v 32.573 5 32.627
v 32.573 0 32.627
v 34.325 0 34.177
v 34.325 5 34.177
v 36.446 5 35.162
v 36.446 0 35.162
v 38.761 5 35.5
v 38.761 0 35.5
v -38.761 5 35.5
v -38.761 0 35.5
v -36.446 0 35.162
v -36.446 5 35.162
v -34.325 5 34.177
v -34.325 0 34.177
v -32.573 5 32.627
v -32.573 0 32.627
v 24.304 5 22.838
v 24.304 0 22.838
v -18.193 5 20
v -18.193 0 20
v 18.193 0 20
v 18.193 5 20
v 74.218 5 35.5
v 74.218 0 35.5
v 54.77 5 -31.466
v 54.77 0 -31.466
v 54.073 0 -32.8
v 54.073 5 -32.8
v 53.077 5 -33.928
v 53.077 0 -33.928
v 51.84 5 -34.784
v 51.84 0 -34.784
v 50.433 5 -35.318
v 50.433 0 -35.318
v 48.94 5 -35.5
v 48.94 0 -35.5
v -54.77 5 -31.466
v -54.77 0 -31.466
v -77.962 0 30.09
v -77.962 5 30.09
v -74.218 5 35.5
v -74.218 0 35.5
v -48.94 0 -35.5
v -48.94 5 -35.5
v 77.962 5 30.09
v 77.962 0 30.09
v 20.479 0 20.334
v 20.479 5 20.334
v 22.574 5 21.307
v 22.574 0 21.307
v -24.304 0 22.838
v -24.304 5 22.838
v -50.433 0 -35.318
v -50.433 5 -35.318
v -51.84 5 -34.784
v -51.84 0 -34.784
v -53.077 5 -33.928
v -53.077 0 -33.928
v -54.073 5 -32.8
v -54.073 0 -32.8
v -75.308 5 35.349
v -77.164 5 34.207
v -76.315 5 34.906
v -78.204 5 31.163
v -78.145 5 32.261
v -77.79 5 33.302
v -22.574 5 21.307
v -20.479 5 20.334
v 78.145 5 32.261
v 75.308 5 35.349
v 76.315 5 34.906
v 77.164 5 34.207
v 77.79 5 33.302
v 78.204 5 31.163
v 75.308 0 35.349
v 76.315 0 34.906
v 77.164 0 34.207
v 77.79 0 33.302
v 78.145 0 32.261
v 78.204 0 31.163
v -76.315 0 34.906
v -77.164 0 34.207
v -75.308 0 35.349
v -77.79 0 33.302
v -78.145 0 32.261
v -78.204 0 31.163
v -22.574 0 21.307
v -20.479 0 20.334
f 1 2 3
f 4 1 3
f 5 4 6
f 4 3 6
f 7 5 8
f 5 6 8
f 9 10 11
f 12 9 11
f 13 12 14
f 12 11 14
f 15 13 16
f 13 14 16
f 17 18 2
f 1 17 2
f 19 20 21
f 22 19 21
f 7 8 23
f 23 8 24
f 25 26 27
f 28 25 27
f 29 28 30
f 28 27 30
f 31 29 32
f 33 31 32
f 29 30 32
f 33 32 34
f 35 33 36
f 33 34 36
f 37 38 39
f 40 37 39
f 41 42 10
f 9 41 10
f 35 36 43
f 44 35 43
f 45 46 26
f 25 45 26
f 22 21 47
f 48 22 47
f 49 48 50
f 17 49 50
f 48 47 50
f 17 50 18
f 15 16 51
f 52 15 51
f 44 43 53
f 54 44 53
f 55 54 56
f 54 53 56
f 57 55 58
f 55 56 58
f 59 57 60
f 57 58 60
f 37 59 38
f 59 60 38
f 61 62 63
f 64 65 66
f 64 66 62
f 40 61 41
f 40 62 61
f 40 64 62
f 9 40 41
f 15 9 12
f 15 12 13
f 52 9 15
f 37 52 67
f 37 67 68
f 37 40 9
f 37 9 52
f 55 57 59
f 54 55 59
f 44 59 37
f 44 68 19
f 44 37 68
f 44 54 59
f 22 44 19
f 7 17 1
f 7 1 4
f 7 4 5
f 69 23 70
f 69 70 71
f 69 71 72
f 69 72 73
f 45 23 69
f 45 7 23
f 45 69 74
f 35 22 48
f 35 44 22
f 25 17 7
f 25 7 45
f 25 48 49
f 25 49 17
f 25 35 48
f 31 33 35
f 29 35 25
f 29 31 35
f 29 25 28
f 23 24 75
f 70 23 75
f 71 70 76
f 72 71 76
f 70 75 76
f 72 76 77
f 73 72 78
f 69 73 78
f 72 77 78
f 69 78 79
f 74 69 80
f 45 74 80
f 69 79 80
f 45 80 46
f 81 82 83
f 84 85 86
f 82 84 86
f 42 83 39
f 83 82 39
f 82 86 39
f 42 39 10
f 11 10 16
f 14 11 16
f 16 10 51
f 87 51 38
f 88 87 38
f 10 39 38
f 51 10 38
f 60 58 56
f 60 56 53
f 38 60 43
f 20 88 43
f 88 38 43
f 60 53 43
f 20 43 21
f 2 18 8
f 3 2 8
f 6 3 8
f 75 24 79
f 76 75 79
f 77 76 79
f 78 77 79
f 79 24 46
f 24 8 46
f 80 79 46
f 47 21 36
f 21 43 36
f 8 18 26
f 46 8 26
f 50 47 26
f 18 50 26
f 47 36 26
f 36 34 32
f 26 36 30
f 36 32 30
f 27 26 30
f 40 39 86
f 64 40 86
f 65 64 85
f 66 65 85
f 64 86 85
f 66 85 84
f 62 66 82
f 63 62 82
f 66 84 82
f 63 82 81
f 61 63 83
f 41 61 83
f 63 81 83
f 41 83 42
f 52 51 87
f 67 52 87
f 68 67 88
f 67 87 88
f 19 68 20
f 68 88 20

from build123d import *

# Parameters (mm, degrees)
BOSS_EXTRUDE1_DEPTH = 5


with BuildPart() as part:
    # Sketch1 → Boss-Extrude1 (new body)
    with BuildSketch(Plane(origin=(0, 0, 0), x_dir=(1, 0, 0), z_dir=(0, 1, 0))):
        with BuildLine():
            Line((48.939716241, 35.5), (-48.939716241, 35.5))
            ThreePointArc((-48.939716241, 35.5), (-52.484341475, 34.393332114), (-54.769665613, 31.46649501))
            Line((-54.769665613, 31.46649501), (-77.961623751, -30.089730331))
            ThreePointArc((-77.961623751, -30.089730331), (-77.507936909, -33.775842846), (-74.218478088, -35.5))
            Line((-74.218478088, -35.5), (-38.760968174, -35.5))
            ThreePointArc((-38.760968174, -35.5), (-35.349777153, -34.746684682), (-32.573080563, -32.626858226))
            Line((-32.573080563, -32.626858226), (-24.304233813, -22.837670888))
            ThreePointArc((-24.304233813, -22.837670888), (-21.561817428, -20.744015129), (-18.192739876, -20))
            Line((-18.192739876, -20), (0, -20))
            Line((0, -20), (18.192739876, -20))
            ThreePointArc((18.192739876, -20), (21.561817428, -20.744015129), (24.304233813, -22.837670888))
            Line((24.304233813, -22.837670888), (32.573080563, -32.626858226))
            ThreePointArc((32.573080563, -32.626858226), (35.349777153, -34.746684682), (38.760968174, -35.5))
            Line((38.760968174, -35.5), (74.218478088, -35.5))
            ThreePointArc((74.218478088, -35.5), (77.507936909, -33.775842846), (77.961623751, -30.089730331))
            Line((77.961623751, -30.089730331), (54.769665613, 31.46649501))
            ThreePointArc((54.769665613, 31.46649501), (52.484341475, 34.393332114), (48.939716241, 35.5))
        make_face()
    extrude(amount=BOSS_EXTRUDE1_DEPTH)


solid = part.part
